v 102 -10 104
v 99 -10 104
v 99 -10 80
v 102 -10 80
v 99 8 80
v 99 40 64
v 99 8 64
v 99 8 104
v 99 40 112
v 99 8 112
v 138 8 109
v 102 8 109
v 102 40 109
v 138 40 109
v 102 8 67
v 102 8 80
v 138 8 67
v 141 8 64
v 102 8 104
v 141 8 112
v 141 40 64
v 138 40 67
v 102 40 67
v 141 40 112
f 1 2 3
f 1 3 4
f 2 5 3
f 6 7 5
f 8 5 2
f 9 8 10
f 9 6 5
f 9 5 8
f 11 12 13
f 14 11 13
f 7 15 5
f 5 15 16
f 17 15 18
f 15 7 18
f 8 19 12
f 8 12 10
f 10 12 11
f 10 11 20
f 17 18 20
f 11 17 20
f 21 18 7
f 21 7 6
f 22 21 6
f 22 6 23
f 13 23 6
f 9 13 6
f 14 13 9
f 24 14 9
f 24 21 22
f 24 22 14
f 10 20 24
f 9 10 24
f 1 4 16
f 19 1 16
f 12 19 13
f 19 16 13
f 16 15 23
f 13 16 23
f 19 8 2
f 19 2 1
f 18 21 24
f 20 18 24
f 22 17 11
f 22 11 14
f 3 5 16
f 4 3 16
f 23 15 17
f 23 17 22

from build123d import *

# Parameters (mm, degrees)
BOX095_W     = 3
BOX095_H     = 32
BOX095_DEPTH = 42
BOX094_W     = 3
BOX094_H     = 32
BOX094_DEPTH = 42
BOX093_W     = 3
BOX093_H     = 32
BOX093_DEPTH = 42
BOX092_W     = 3
BOX092_H     = 32
BOX092_DEPTH = 42
BOX091_W     = 3
BOX091_H     = 18
BOX091_DEPTH = 24


with BuildPart() as box095:
    # Box095 → Box095 (new body)
    with BuildSketch(Plane(origin=(99, 8, 67), x_dir=(1, 0, 0), z_dir=(0, 0, 1))):
        with Locations((1.5, 16)):
            Rectangle(BOX095_W, BOX095_H)
    extrude(amount=BOX095_DEPTH)


with BuildPart() as box094:
    # Box094 → Box094 (new body)
    with BuildSketch(Plane(origin=(141, 8, 109), x_dir=(0, 0, 1), z_dir=(-1, 0, 0))):
        with Locations((1.5, 16)):
            Rectangle(BOX094_W, BOX094_H)
    extrude(amount=BOX094_DEPTH)


with BuildPart() as box093:
    # Box093 → Box093 (new body)
    with BuildSketch(Plane(origin=(138, 8, 67), x_dir=(1, 0, 0), z_dir=(0, 0, 1))):
        with Locations((1.5, 16)):
            Rectangle(BOX093_W, BOX093_H)
    extrude(amount=BOX093_DEPTH)


with BuildPart() as box092:
    # Box092 → Box092 (new body)
    with BuildSketch(Plane(origin=(141, 8, 64), x_dir=(0, 0, 1), z_dir=(-1, 0, 0))):
        with Locations((1.5, 16)):
            Rectangle(BOX092_W, BOX092_H)
    extrude(amount=BOX092_DEPTH)


with BuildPart() as fusion117:
    # Box091 → Box091 (new body)
    with BuildSketch(Plane(origin=(99, -10, 80), x_dir=(1, 0, 0), z_dir=(0, 0, 1))):
        with Locations((1.5, 9)):
            Rectangle(BOX091_W, BOX091_H)
    extrude(amount=BOX091_DEPTH)

    # Fusion117: union Box095, Box094, Box093, Box092
    add(box095.part)
    add(box094.part)
    add(box093.part)
    add(box092.part)


solid = fusion117.part
